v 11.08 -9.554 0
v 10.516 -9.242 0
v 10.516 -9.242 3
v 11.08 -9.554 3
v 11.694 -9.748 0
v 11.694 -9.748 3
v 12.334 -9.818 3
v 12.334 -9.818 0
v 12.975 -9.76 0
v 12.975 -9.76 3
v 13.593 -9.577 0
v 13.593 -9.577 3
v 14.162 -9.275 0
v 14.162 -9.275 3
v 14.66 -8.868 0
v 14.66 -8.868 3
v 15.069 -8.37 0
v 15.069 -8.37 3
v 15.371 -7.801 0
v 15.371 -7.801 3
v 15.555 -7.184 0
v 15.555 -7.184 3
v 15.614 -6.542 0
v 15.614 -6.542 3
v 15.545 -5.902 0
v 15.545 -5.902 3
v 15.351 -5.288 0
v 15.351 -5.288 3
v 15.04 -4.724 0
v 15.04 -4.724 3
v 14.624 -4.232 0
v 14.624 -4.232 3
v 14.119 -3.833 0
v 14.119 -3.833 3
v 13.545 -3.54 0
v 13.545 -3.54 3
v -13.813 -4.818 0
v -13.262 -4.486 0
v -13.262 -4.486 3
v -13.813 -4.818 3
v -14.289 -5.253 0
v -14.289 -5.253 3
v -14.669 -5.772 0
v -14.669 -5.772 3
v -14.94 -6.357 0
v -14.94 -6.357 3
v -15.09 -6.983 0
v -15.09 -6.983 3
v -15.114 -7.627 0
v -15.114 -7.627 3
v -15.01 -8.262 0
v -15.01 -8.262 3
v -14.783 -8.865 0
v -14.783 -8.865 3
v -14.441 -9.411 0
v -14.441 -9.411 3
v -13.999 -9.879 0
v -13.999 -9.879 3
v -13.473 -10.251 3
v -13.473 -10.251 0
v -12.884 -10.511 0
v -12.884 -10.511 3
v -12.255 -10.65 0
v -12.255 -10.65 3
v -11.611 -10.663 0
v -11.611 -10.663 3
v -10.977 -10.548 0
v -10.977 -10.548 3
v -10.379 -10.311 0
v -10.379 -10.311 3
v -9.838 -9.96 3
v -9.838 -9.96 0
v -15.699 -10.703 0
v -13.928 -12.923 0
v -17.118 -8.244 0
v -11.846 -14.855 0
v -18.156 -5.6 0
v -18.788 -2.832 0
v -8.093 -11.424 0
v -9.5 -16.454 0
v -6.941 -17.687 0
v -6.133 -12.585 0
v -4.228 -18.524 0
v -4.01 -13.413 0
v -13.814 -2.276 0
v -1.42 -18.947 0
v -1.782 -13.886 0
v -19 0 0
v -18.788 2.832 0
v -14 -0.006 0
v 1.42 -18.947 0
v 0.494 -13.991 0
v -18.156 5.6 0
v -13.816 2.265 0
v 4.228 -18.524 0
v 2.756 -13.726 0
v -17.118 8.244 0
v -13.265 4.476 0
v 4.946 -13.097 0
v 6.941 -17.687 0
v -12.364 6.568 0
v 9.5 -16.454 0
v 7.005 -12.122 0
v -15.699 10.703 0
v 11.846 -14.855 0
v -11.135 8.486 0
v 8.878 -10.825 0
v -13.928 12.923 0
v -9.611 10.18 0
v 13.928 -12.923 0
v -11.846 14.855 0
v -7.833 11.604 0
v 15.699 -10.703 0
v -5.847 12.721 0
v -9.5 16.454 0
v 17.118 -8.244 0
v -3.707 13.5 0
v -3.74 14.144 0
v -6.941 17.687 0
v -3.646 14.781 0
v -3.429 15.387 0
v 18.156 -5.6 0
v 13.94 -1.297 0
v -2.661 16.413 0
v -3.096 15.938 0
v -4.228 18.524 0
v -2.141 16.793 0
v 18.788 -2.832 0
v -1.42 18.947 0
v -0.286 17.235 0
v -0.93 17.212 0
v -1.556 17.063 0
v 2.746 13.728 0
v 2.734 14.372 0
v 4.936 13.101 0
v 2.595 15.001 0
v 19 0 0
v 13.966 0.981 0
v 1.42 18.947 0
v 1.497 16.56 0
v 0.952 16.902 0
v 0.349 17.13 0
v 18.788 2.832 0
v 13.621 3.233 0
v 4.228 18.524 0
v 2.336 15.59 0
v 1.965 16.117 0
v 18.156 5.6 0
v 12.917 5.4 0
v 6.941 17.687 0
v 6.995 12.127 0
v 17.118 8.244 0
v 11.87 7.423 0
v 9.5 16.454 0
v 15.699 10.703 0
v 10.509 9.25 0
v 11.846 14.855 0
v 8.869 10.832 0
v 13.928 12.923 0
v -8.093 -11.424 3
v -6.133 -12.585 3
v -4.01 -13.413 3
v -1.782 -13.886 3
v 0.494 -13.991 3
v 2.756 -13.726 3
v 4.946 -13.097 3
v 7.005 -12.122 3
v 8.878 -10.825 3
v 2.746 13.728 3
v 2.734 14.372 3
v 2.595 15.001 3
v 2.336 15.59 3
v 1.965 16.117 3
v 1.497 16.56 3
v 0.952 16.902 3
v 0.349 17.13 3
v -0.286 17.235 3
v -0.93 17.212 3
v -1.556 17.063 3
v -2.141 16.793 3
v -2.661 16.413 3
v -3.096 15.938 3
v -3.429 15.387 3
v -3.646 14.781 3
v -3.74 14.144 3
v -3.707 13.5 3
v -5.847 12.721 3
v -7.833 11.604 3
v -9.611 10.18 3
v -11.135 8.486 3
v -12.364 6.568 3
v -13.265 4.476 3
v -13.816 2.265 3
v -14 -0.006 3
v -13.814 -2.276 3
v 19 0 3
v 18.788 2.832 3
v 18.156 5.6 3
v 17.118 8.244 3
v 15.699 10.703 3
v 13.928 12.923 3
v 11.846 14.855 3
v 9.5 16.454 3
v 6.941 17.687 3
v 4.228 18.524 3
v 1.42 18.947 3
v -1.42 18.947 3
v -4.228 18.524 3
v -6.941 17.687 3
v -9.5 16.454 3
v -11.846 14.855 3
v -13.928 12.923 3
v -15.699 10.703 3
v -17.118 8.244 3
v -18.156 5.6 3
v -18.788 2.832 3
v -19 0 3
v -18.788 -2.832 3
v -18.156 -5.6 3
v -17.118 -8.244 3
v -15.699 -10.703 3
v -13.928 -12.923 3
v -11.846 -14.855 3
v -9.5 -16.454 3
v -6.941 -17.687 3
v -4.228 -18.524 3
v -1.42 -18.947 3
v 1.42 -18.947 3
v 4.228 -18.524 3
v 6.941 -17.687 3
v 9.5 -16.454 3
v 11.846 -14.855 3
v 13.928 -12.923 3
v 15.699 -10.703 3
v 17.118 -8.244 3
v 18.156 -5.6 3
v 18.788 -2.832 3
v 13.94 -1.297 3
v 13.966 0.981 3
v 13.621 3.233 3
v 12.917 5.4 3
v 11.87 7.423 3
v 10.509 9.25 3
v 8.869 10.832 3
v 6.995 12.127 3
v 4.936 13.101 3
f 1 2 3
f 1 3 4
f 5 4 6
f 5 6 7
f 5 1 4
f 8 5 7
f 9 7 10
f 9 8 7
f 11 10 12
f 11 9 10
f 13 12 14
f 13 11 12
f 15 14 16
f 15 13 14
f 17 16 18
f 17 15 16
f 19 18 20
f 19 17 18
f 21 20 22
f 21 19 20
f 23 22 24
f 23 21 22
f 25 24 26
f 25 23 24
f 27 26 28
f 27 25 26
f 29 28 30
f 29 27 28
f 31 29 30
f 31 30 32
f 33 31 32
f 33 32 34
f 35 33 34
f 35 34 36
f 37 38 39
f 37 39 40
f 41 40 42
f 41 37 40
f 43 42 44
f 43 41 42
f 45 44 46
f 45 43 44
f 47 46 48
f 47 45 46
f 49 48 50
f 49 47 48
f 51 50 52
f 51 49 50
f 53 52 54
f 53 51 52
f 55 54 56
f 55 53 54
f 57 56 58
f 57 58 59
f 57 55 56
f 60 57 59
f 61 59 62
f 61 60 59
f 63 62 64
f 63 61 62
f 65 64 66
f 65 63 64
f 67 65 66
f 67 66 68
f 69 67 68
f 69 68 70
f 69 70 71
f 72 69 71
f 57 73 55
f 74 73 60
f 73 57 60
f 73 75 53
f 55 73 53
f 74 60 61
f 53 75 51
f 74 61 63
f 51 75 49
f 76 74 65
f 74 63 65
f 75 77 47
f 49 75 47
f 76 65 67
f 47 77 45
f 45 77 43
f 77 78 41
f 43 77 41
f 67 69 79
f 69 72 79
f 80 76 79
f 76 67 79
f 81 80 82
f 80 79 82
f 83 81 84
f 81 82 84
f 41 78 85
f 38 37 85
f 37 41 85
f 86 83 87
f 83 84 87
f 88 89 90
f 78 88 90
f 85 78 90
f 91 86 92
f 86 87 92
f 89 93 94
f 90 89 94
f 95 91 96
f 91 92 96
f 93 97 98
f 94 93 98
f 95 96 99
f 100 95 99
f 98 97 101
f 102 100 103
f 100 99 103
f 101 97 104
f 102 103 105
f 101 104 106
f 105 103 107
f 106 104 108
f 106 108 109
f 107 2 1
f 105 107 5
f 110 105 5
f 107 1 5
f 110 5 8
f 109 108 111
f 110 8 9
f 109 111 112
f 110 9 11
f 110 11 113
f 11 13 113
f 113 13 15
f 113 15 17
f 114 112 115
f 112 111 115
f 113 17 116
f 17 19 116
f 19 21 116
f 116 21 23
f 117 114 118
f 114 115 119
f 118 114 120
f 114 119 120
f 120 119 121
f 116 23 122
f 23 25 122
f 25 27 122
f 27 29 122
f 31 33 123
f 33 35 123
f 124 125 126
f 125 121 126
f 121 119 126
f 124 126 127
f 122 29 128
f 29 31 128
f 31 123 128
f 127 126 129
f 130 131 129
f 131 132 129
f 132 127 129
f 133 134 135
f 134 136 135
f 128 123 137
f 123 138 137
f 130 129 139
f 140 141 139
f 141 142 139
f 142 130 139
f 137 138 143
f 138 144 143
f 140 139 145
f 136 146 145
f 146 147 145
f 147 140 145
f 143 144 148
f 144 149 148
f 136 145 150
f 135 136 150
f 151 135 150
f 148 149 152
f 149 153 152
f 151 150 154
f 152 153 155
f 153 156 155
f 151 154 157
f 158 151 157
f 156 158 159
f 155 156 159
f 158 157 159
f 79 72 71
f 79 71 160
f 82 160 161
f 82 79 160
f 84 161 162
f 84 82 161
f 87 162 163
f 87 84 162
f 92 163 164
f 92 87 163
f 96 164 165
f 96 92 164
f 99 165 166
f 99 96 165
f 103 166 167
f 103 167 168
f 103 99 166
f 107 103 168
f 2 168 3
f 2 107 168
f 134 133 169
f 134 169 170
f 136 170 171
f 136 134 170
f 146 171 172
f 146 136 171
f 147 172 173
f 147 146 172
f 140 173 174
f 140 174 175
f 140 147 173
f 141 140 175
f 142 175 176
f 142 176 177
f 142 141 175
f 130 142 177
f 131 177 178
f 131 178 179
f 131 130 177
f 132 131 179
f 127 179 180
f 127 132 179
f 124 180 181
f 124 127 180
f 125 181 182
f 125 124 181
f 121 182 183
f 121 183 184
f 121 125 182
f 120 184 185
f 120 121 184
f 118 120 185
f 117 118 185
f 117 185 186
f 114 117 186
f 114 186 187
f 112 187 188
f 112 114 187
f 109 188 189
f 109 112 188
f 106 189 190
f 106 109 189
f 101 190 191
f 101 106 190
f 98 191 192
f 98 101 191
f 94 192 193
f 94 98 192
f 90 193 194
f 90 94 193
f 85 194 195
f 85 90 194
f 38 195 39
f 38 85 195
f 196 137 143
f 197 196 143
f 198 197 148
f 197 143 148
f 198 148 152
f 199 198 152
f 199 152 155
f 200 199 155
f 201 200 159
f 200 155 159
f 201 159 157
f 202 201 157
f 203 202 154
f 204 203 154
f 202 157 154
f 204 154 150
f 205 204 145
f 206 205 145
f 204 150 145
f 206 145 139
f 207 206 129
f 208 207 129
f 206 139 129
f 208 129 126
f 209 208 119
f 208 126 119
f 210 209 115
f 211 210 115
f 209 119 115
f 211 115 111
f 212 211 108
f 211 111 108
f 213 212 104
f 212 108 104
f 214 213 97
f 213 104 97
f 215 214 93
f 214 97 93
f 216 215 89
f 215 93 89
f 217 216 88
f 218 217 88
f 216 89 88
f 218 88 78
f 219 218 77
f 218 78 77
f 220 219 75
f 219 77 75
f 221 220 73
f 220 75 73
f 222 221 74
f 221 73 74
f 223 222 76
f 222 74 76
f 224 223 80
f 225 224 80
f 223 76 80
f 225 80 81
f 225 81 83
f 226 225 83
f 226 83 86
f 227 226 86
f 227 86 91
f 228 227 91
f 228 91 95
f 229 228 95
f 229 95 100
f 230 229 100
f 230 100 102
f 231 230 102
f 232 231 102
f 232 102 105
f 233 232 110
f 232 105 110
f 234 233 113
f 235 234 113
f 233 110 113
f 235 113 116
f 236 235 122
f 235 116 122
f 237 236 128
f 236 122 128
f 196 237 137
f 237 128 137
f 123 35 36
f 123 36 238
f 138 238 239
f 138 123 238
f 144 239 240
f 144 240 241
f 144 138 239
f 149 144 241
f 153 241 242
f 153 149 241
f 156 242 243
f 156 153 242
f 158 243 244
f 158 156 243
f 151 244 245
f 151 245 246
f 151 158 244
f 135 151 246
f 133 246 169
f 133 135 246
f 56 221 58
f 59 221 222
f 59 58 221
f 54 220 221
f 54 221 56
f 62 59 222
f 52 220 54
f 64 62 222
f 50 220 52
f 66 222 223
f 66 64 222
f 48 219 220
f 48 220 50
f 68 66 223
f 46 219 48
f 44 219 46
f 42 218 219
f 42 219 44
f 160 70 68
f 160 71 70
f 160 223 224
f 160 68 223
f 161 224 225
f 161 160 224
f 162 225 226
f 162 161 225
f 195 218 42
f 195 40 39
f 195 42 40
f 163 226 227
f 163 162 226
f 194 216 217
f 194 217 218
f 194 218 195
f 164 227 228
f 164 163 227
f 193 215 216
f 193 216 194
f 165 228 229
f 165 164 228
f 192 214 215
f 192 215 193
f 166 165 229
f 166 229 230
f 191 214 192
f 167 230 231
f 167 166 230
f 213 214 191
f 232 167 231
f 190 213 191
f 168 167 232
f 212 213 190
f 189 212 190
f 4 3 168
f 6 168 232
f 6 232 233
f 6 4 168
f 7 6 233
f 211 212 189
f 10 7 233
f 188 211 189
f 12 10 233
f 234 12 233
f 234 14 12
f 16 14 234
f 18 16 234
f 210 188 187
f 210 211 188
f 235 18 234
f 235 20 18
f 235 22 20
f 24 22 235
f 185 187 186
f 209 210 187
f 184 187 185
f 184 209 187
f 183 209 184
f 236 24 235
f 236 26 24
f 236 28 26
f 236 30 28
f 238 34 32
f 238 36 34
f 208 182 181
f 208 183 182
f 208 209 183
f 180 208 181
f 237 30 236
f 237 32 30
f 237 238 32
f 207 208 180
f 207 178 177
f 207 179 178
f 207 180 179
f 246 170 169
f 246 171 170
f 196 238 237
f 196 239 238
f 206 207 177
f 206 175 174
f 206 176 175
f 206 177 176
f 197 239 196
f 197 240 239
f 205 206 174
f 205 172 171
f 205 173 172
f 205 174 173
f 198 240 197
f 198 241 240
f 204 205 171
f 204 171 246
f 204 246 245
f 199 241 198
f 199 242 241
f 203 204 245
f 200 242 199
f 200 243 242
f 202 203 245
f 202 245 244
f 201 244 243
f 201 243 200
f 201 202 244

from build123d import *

# Parameters (mm, degrees)
ESQUISSE1_R        = 19
BOSS_EXTRU_2_DEPTH = 3


with BuildPart() as part:
    # Esquisse1 → Boss.-Extru.2 (new body)
    with BuildSketch(Plane.XY):
        Circle(ESQUISSE1_R)
        with BuildLine():
            ThreePointArc((2.745524809, 13.728149676), (-0.608438359, 17.239266306), (-3.706523595, 13.500432691))
            ThreePointArc((-3.706523595, 13.500432691), (-12.363713879, 6.567996584), (-13.261688771, -4.486380606))
            ThreePointArc((-13.261688771, -4.486380606), (-14.625423384, -9.146556229), (-9.838455875, -9.960159939))
            ThreePointArc((-9.838455875, -9.960159939), (0.493805045, -13.991288596), (10.516163961, -9.24176907))
            ThreePointArc((10.516163961, -9.24176907), (15.233861743, -8.092710077), (13.54497947, -3.540272752))
            ThreePointArc((13.54497947, -3.540272752), (11.869908833, 7.423292012), (2.745524809, 13.728149676))
        make_face(mode=Mode.SUBTRACT)
    extrude(amount=BOSS_EXTRU_2_DEPTH)


solid = part.part
